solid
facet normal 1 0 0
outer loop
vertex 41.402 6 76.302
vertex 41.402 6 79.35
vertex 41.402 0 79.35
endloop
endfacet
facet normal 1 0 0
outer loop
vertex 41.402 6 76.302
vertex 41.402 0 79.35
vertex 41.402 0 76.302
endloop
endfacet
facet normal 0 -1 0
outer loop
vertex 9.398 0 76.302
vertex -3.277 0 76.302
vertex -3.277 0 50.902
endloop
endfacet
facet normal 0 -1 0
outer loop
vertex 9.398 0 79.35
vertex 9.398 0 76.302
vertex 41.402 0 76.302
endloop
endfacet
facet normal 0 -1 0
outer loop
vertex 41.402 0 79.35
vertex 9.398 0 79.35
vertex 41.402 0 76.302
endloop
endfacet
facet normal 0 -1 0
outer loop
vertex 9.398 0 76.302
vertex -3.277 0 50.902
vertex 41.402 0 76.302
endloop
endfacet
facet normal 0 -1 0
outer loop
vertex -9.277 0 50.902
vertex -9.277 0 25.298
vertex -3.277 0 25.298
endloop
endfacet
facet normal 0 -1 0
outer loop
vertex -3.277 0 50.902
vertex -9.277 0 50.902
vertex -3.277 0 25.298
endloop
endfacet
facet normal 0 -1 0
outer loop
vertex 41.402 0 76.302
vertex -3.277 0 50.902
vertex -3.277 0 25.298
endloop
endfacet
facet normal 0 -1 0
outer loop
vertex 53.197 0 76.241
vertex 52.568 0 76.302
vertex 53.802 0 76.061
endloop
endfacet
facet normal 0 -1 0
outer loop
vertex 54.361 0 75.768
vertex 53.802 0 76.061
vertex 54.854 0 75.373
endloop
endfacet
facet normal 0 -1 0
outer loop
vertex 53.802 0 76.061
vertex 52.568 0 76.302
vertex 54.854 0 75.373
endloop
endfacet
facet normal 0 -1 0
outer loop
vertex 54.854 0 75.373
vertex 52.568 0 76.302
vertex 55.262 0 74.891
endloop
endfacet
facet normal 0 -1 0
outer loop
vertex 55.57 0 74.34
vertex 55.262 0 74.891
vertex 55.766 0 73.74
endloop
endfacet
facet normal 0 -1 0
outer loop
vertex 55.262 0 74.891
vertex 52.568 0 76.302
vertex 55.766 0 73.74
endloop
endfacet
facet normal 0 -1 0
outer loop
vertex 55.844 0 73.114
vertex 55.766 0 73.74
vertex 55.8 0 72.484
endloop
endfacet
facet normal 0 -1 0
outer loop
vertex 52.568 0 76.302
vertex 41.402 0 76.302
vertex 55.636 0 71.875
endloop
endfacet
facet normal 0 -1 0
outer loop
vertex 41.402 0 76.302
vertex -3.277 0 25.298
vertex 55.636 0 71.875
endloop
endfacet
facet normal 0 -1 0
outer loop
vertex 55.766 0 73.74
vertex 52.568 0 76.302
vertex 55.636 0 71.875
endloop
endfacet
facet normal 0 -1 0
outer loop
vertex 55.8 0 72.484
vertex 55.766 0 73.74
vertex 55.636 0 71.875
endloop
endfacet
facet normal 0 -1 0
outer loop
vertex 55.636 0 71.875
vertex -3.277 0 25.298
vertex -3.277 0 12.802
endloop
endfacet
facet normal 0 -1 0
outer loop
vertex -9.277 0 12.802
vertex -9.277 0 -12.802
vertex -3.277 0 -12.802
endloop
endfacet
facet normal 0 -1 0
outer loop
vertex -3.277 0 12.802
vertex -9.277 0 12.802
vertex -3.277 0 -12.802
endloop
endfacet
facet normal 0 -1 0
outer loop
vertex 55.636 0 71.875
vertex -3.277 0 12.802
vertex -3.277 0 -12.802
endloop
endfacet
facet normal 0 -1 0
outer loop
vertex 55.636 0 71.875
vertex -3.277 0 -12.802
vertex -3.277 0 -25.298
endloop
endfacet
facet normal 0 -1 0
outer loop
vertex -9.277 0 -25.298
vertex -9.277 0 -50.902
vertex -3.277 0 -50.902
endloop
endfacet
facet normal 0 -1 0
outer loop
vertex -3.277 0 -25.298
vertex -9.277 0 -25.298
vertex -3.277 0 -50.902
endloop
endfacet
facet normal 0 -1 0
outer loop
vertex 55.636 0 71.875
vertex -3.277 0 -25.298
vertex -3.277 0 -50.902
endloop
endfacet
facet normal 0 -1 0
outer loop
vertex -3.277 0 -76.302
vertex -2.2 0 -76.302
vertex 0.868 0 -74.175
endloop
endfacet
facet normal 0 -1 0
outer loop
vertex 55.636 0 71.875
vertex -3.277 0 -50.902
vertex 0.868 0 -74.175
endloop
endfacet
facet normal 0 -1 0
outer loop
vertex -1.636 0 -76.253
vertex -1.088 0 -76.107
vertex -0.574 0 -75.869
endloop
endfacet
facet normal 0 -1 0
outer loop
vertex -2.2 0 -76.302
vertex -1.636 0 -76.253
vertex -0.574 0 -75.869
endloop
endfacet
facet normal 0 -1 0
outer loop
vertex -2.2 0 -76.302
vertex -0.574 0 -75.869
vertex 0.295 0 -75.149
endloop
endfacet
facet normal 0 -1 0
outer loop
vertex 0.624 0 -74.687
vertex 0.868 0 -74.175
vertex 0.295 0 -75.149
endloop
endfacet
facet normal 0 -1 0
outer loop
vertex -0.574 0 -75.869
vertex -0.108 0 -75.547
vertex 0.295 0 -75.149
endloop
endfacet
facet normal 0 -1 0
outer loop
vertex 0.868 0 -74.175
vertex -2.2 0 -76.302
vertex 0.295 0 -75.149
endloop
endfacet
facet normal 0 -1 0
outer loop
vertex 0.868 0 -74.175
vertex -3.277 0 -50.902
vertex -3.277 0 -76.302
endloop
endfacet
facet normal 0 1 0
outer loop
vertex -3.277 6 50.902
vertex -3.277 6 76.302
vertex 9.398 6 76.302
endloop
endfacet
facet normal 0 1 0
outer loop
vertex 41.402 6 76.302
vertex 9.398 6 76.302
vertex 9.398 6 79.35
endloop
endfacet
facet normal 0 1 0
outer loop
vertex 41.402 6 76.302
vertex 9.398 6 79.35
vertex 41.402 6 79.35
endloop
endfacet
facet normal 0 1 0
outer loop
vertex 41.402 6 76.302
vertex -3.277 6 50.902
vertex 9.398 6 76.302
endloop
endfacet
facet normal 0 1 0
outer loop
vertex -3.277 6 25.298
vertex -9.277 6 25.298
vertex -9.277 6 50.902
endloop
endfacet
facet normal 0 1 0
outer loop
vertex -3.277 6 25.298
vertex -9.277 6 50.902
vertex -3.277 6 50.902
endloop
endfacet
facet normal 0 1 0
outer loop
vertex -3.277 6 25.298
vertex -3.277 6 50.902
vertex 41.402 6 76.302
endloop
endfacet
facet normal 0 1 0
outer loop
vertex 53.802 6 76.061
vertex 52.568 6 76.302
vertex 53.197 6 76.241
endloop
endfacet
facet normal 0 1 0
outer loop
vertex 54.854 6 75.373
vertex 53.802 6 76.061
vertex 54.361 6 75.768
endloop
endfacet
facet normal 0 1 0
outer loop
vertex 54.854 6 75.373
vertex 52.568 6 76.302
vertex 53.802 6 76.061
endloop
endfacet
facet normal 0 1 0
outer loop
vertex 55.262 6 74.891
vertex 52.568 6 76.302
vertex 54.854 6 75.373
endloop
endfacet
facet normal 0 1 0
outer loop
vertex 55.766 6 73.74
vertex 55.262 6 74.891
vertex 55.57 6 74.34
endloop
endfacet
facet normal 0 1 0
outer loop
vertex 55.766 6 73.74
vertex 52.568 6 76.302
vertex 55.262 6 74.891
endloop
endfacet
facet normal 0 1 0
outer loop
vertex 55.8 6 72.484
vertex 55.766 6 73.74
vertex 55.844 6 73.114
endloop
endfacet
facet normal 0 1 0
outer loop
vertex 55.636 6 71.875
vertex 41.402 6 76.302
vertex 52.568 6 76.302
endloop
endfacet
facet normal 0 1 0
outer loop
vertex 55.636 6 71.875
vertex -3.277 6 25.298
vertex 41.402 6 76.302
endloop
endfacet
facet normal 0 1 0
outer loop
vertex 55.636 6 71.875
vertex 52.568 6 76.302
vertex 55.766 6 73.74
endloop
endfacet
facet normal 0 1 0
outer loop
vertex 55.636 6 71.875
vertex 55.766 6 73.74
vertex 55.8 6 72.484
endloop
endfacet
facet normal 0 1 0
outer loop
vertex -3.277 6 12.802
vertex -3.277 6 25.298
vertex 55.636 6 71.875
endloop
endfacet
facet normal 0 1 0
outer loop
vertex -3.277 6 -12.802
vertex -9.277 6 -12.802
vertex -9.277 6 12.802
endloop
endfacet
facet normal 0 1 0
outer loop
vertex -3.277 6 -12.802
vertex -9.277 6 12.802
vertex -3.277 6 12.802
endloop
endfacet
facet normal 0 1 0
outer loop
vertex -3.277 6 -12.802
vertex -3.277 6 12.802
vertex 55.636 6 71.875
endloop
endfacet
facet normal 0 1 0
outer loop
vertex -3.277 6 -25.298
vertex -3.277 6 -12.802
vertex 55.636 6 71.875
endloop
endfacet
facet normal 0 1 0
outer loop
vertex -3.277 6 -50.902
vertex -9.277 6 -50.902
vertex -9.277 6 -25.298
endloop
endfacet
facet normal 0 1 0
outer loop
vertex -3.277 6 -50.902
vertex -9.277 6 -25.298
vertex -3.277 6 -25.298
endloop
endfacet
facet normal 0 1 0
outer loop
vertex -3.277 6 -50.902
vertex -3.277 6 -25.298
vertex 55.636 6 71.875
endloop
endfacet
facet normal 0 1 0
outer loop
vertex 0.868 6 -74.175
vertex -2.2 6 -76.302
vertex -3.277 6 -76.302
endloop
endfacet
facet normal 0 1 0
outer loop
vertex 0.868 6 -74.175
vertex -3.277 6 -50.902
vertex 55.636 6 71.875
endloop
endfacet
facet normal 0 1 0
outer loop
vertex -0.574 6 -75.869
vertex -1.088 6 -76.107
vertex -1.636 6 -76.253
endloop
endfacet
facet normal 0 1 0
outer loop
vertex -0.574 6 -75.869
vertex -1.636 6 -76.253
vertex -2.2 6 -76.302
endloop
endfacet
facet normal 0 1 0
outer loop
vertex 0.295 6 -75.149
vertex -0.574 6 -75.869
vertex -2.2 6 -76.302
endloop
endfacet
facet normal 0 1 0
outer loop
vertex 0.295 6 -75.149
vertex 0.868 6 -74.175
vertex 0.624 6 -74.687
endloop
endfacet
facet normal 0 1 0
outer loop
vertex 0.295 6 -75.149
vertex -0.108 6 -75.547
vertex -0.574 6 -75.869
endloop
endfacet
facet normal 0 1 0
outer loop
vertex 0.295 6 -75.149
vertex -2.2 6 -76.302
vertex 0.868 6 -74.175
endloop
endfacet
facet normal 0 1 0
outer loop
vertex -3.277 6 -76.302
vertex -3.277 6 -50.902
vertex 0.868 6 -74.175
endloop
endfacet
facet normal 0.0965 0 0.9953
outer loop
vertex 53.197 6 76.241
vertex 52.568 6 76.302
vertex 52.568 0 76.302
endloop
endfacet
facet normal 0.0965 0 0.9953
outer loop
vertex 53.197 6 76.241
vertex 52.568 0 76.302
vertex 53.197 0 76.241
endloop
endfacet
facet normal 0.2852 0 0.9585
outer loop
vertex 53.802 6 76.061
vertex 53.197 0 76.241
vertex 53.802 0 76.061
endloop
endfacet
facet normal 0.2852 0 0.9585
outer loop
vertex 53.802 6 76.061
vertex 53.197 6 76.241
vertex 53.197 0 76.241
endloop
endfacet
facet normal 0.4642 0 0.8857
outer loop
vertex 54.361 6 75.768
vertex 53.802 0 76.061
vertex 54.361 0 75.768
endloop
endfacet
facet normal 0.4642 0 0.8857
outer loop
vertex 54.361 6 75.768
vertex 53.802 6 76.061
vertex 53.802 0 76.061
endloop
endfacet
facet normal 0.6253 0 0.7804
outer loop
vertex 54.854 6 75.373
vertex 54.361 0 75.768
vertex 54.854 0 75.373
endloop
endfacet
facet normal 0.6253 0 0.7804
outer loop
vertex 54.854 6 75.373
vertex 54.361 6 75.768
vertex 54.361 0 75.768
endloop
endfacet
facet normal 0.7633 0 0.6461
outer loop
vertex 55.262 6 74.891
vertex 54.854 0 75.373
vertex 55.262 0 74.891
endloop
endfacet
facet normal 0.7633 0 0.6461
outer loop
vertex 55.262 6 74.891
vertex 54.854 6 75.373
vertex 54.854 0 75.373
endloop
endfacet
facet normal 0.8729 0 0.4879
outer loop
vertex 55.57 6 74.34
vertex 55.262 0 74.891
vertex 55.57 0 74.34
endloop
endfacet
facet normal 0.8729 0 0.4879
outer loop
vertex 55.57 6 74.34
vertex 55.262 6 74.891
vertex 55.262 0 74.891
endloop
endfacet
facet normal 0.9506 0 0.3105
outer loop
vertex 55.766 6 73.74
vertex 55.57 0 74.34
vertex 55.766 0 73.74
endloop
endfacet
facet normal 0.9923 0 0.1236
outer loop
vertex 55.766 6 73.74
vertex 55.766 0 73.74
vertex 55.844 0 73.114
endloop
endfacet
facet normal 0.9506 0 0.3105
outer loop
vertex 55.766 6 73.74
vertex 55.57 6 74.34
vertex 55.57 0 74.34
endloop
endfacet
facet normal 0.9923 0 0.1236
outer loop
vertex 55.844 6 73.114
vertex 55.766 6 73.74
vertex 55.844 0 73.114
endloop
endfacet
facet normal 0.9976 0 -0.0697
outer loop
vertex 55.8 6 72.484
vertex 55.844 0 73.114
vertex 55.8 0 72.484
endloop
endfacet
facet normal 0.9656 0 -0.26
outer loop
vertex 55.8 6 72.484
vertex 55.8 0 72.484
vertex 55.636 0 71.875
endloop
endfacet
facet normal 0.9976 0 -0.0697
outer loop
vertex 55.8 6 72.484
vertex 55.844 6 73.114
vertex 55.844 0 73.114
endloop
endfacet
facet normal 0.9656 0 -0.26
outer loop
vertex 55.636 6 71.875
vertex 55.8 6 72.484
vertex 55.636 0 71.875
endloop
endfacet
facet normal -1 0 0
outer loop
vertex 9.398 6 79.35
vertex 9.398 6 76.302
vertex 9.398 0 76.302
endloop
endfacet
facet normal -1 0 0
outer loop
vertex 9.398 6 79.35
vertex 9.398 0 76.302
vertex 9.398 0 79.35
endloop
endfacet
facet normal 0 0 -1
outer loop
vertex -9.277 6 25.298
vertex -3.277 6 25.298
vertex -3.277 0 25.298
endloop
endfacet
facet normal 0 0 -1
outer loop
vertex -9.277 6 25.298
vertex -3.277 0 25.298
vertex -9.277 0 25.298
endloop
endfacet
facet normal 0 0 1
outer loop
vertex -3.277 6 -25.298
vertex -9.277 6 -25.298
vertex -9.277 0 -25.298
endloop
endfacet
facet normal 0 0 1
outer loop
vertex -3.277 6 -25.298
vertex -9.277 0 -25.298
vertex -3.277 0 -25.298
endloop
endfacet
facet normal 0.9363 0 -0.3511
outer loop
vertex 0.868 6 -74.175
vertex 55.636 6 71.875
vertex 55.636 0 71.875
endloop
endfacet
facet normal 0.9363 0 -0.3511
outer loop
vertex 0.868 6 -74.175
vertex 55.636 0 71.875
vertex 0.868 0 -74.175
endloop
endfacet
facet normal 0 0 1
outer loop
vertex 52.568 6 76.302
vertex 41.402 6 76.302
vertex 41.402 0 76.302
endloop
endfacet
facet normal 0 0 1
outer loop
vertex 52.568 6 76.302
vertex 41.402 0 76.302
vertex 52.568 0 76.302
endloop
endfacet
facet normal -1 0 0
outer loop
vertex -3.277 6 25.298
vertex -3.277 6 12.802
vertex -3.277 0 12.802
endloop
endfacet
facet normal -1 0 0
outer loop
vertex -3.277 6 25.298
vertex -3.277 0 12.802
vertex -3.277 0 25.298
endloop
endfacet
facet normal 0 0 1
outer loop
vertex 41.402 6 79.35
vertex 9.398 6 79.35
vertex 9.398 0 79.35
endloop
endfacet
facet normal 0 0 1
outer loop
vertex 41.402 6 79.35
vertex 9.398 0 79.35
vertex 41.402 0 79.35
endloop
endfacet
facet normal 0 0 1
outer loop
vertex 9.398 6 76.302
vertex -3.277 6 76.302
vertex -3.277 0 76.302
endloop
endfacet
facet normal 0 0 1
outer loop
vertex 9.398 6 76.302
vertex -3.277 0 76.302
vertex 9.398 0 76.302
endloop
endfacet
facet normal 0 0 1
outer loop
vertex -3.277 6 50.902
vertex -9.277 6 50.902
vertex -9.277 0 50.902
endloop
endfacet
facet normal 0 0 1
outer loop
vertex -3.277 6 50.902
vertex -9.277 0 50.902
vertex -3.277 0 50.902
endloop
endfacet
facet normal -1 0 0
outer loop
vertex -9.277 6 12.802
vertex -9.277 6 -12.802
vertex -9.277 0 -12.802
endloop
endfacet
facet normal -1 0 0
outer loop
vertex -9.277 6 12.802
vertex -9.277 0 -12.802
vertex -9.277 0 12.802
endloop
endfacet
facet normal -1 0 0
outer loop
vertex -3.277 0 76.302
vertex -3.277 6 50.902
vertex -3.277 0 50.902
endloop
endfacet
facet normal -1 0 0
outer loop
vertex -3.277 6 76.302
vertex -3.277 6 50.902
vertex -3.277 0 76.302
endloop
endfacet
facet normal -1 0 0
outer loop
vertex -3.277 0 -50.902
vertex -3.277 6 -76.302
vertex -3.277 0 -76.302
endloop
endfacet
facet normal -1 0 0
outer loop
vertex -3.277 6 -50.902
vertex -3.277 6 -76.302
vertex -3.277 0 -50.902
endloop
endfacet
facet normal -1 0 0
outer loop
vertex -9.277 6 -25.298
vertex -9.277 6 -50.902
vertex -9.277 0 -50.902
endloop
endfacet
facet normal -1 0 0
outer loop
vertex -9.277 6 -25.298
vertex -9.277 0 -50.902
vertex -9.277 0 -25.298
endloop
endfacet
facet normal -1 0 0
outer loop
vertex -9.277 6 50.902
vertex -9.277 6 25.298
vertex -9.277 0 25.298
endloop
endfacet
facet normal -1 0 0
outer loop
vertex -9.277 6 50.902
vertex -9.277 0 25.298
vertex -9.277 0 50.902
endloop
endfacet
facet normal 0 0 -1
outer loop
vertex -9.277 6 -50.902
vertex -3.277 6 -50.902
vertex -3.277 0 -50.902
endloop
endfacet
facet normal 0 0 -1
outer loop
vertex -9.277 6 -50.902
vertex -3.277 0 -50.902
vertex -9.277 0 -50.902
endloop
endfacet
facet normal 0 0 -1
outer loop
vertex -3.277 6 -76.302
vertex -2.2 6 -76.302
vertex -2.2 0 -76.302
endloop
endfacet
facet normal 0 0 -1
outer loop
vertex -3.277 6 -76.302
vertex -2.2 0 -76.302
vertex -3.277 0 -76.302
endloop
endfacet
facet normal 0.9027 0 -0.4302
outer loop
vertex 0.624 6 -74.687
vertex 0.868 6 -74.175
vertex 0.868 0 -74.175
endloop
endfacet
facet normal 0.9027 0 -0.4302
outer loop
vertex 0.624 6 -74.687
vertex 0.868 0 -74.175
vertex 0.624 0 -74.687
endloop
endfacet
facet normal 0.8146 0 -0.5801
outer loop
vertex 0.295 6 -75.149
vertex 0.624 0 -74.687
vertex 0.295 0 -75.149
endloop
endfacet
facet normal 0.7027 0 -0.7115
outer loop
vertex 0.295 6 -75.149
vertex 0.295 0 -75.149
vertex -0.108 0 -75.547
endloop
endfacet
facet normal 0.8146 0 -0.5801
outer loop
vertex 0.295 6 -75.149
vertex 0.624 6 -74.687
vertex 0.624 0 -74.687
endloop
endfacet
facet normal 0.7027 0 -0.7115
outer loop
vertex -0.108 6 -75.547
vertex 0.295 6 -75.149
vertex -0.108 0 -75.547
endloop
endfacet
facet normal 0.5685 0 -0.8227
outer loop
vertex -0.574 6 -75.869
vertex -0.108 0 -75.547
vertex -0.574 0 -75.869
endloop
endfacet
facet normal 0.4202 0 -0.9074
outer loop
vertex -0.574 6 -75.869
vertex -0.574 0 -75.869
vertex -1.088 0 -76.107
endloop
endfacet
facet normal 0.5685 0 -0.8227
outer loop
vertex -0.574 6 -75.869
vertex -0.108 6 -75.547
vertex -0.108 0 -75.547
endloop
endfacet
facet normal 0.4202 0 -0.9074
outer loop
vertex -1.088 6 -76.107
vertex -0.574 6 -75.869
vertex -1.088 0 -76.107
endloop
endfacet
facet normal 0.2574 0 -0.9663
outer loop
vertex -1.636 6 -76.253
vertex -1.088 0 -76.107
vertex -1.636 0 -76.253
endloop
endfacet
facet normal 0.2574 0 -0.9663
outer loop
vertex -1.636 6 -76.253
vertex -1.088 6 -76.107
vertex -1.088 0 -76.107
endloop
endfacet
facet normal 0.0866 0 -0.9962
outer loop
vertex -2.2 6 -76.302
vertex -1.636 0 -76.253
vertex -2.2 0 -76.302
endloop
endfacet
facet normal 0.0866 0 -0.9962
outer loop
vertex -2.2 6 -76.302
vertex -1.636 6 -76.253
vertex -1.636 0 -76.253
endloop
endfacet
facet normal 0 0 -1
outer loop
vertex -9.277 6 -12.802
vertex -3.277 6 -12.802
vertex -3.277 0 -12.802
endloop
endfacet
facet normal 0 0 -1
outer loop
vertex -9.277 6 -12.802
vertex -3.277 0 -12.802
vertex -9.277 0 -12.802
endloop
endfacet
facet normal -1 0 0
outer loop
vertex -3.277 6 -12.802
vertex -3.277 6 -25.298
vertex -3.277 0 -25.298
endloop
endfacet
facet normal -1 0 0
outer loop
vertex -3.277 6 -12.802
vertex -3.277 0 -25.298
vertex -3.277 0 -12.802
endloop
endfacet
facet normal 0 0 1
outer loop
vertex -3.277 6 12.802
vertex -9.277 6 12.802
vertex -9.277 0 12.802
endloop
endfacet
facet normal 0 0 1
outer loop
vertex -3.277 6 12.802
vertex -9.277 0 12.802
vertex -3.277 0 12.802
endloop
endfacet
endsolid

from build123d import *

# Parameters (mm, degrees)
BOSS_EXTRUDE1_DEPTH = 6
SKETCH2_W           = 6
SKETCH2_H           = 25.4
SKETCH2_W_2         = 31.8008
SKETCH2_H_2         = 3.048
BOSS_EXTRUDE4_DEPTH = 6
FILLET1_R           = 3.175
KERF_DEPTH          = 6


with BuildPart() as part:
    # Sketch1 → Boss-Extrude1 (new body)
    with BuildSketch(Plane(origin=(0, 0, 0), x_dir=(1, 0, 0), z_dir=(0, 1, 0))):
        Polygon((-3.175, 76.2), (-3.175, -76.2), (57.15, -76.2), (0, 76.2), align=None)
    extrude(amount=BOSS_EXTRUDE1_DEPTH)

    # Sketch2 → Boss-Extrude4 (add)
    with BuildSketch(Plane(origin=(0, 0, 0), x_dir=(1, 0, 0), z_dir=(0, 1, 0))):
        with Locations((-6.175, 0)):
            Rectangle(SKETCH2_W, SKETCH2_H)
        with Locations((-6.175, 38.1)):
            Rectangle(SKETCH2_W, SKETCH2_H)
        with Locations((-6.175, -38.1)):
            Rectangle(SKETCH2_W, SKETCH2_H)
        with Locations((25.4, -77.724)):
            Rectangle(SKETCH2_W_2, SKETCH2_H_2)
    extrude(amount=BOSS_EXTRUDE4_DEPTH)

    # Fillet1
    fillet1_edges = [part.edges().sort_by_distance(p)[0] for p in [
        (0, 3, -76.2),
        (57.15, 3, 76.2),
    ]]
    fillet(fillet1_edges, radius=FILLET1_R)

    # Sketch3 → KERF (add)
    with BuildSketch(Plane(origin=(0, 6, 0), x_dir=(1, 0, 0), z_dir=(0, 1, 0))):
        with BuildLine():
            Line((41.402, -76.3016), (52.568473514, -76.3016))
            ThreePointArc((52.568473514, -76.3016), (55.261594992, -74.891334445), (55.636449697, -71.874508931))
            Line((55.636449697, -71.874508931), (0.867699697, 74.175491069))
            ThreePointArc((0.867699697, 74.175491069), (-0.333942041, 75.718121478), (-2.200276486, 76.3016))
            Line((-2.200276486, 76.3016), (-3.2766, 76.3016))
            Line((-3.2766, 76.3016), (-3.2766, 50.9016))
            Line((-3.2766, 50.9016), (-9.2766, 50.9016))
            Line((-9.2766, 50.9016), (-9.2766, 25.2984))
            Line((-9.2766, 25.2984), (-3.2766, 25.2984))
            Line((-3.2766, 25.2984), (-3.2766, 12.8016))
            Line((-3.2766, 12.8016), (-9.2766, 12.8016))
            Line((-9.2766, 12.8016), (-9.2766, -12.8016))
            Line((-9.2766, -12.8016), (-3.2766, -12.8016))
            Line((-3.2766, -12.8016), (-3.2766, -25.2984))
            Line((-3.2766, -25.2984), (-9.2766, -25.2984))
            Line((-9.2766, -25.2984), (-9.2766, -50.9016))
            Line((-9.2766, -50.9016), (-3.2766, -50.9016))
            Line((-3.2766, -50.9016), (-3.2766, -76.3016))
            Line((-3.2766, -76.3016), (9.398, -76.3016))
            Line((9.398, -76.3016), (9.398, -79.3496))
            Line((9.398, -79.3496), (41.402, -79.3496))
            Line((41.402, -79.3496), (41.402, -76.3016))
        make_face()
    extrude(amount=-KERF_DEPTH)


solid = part.part
